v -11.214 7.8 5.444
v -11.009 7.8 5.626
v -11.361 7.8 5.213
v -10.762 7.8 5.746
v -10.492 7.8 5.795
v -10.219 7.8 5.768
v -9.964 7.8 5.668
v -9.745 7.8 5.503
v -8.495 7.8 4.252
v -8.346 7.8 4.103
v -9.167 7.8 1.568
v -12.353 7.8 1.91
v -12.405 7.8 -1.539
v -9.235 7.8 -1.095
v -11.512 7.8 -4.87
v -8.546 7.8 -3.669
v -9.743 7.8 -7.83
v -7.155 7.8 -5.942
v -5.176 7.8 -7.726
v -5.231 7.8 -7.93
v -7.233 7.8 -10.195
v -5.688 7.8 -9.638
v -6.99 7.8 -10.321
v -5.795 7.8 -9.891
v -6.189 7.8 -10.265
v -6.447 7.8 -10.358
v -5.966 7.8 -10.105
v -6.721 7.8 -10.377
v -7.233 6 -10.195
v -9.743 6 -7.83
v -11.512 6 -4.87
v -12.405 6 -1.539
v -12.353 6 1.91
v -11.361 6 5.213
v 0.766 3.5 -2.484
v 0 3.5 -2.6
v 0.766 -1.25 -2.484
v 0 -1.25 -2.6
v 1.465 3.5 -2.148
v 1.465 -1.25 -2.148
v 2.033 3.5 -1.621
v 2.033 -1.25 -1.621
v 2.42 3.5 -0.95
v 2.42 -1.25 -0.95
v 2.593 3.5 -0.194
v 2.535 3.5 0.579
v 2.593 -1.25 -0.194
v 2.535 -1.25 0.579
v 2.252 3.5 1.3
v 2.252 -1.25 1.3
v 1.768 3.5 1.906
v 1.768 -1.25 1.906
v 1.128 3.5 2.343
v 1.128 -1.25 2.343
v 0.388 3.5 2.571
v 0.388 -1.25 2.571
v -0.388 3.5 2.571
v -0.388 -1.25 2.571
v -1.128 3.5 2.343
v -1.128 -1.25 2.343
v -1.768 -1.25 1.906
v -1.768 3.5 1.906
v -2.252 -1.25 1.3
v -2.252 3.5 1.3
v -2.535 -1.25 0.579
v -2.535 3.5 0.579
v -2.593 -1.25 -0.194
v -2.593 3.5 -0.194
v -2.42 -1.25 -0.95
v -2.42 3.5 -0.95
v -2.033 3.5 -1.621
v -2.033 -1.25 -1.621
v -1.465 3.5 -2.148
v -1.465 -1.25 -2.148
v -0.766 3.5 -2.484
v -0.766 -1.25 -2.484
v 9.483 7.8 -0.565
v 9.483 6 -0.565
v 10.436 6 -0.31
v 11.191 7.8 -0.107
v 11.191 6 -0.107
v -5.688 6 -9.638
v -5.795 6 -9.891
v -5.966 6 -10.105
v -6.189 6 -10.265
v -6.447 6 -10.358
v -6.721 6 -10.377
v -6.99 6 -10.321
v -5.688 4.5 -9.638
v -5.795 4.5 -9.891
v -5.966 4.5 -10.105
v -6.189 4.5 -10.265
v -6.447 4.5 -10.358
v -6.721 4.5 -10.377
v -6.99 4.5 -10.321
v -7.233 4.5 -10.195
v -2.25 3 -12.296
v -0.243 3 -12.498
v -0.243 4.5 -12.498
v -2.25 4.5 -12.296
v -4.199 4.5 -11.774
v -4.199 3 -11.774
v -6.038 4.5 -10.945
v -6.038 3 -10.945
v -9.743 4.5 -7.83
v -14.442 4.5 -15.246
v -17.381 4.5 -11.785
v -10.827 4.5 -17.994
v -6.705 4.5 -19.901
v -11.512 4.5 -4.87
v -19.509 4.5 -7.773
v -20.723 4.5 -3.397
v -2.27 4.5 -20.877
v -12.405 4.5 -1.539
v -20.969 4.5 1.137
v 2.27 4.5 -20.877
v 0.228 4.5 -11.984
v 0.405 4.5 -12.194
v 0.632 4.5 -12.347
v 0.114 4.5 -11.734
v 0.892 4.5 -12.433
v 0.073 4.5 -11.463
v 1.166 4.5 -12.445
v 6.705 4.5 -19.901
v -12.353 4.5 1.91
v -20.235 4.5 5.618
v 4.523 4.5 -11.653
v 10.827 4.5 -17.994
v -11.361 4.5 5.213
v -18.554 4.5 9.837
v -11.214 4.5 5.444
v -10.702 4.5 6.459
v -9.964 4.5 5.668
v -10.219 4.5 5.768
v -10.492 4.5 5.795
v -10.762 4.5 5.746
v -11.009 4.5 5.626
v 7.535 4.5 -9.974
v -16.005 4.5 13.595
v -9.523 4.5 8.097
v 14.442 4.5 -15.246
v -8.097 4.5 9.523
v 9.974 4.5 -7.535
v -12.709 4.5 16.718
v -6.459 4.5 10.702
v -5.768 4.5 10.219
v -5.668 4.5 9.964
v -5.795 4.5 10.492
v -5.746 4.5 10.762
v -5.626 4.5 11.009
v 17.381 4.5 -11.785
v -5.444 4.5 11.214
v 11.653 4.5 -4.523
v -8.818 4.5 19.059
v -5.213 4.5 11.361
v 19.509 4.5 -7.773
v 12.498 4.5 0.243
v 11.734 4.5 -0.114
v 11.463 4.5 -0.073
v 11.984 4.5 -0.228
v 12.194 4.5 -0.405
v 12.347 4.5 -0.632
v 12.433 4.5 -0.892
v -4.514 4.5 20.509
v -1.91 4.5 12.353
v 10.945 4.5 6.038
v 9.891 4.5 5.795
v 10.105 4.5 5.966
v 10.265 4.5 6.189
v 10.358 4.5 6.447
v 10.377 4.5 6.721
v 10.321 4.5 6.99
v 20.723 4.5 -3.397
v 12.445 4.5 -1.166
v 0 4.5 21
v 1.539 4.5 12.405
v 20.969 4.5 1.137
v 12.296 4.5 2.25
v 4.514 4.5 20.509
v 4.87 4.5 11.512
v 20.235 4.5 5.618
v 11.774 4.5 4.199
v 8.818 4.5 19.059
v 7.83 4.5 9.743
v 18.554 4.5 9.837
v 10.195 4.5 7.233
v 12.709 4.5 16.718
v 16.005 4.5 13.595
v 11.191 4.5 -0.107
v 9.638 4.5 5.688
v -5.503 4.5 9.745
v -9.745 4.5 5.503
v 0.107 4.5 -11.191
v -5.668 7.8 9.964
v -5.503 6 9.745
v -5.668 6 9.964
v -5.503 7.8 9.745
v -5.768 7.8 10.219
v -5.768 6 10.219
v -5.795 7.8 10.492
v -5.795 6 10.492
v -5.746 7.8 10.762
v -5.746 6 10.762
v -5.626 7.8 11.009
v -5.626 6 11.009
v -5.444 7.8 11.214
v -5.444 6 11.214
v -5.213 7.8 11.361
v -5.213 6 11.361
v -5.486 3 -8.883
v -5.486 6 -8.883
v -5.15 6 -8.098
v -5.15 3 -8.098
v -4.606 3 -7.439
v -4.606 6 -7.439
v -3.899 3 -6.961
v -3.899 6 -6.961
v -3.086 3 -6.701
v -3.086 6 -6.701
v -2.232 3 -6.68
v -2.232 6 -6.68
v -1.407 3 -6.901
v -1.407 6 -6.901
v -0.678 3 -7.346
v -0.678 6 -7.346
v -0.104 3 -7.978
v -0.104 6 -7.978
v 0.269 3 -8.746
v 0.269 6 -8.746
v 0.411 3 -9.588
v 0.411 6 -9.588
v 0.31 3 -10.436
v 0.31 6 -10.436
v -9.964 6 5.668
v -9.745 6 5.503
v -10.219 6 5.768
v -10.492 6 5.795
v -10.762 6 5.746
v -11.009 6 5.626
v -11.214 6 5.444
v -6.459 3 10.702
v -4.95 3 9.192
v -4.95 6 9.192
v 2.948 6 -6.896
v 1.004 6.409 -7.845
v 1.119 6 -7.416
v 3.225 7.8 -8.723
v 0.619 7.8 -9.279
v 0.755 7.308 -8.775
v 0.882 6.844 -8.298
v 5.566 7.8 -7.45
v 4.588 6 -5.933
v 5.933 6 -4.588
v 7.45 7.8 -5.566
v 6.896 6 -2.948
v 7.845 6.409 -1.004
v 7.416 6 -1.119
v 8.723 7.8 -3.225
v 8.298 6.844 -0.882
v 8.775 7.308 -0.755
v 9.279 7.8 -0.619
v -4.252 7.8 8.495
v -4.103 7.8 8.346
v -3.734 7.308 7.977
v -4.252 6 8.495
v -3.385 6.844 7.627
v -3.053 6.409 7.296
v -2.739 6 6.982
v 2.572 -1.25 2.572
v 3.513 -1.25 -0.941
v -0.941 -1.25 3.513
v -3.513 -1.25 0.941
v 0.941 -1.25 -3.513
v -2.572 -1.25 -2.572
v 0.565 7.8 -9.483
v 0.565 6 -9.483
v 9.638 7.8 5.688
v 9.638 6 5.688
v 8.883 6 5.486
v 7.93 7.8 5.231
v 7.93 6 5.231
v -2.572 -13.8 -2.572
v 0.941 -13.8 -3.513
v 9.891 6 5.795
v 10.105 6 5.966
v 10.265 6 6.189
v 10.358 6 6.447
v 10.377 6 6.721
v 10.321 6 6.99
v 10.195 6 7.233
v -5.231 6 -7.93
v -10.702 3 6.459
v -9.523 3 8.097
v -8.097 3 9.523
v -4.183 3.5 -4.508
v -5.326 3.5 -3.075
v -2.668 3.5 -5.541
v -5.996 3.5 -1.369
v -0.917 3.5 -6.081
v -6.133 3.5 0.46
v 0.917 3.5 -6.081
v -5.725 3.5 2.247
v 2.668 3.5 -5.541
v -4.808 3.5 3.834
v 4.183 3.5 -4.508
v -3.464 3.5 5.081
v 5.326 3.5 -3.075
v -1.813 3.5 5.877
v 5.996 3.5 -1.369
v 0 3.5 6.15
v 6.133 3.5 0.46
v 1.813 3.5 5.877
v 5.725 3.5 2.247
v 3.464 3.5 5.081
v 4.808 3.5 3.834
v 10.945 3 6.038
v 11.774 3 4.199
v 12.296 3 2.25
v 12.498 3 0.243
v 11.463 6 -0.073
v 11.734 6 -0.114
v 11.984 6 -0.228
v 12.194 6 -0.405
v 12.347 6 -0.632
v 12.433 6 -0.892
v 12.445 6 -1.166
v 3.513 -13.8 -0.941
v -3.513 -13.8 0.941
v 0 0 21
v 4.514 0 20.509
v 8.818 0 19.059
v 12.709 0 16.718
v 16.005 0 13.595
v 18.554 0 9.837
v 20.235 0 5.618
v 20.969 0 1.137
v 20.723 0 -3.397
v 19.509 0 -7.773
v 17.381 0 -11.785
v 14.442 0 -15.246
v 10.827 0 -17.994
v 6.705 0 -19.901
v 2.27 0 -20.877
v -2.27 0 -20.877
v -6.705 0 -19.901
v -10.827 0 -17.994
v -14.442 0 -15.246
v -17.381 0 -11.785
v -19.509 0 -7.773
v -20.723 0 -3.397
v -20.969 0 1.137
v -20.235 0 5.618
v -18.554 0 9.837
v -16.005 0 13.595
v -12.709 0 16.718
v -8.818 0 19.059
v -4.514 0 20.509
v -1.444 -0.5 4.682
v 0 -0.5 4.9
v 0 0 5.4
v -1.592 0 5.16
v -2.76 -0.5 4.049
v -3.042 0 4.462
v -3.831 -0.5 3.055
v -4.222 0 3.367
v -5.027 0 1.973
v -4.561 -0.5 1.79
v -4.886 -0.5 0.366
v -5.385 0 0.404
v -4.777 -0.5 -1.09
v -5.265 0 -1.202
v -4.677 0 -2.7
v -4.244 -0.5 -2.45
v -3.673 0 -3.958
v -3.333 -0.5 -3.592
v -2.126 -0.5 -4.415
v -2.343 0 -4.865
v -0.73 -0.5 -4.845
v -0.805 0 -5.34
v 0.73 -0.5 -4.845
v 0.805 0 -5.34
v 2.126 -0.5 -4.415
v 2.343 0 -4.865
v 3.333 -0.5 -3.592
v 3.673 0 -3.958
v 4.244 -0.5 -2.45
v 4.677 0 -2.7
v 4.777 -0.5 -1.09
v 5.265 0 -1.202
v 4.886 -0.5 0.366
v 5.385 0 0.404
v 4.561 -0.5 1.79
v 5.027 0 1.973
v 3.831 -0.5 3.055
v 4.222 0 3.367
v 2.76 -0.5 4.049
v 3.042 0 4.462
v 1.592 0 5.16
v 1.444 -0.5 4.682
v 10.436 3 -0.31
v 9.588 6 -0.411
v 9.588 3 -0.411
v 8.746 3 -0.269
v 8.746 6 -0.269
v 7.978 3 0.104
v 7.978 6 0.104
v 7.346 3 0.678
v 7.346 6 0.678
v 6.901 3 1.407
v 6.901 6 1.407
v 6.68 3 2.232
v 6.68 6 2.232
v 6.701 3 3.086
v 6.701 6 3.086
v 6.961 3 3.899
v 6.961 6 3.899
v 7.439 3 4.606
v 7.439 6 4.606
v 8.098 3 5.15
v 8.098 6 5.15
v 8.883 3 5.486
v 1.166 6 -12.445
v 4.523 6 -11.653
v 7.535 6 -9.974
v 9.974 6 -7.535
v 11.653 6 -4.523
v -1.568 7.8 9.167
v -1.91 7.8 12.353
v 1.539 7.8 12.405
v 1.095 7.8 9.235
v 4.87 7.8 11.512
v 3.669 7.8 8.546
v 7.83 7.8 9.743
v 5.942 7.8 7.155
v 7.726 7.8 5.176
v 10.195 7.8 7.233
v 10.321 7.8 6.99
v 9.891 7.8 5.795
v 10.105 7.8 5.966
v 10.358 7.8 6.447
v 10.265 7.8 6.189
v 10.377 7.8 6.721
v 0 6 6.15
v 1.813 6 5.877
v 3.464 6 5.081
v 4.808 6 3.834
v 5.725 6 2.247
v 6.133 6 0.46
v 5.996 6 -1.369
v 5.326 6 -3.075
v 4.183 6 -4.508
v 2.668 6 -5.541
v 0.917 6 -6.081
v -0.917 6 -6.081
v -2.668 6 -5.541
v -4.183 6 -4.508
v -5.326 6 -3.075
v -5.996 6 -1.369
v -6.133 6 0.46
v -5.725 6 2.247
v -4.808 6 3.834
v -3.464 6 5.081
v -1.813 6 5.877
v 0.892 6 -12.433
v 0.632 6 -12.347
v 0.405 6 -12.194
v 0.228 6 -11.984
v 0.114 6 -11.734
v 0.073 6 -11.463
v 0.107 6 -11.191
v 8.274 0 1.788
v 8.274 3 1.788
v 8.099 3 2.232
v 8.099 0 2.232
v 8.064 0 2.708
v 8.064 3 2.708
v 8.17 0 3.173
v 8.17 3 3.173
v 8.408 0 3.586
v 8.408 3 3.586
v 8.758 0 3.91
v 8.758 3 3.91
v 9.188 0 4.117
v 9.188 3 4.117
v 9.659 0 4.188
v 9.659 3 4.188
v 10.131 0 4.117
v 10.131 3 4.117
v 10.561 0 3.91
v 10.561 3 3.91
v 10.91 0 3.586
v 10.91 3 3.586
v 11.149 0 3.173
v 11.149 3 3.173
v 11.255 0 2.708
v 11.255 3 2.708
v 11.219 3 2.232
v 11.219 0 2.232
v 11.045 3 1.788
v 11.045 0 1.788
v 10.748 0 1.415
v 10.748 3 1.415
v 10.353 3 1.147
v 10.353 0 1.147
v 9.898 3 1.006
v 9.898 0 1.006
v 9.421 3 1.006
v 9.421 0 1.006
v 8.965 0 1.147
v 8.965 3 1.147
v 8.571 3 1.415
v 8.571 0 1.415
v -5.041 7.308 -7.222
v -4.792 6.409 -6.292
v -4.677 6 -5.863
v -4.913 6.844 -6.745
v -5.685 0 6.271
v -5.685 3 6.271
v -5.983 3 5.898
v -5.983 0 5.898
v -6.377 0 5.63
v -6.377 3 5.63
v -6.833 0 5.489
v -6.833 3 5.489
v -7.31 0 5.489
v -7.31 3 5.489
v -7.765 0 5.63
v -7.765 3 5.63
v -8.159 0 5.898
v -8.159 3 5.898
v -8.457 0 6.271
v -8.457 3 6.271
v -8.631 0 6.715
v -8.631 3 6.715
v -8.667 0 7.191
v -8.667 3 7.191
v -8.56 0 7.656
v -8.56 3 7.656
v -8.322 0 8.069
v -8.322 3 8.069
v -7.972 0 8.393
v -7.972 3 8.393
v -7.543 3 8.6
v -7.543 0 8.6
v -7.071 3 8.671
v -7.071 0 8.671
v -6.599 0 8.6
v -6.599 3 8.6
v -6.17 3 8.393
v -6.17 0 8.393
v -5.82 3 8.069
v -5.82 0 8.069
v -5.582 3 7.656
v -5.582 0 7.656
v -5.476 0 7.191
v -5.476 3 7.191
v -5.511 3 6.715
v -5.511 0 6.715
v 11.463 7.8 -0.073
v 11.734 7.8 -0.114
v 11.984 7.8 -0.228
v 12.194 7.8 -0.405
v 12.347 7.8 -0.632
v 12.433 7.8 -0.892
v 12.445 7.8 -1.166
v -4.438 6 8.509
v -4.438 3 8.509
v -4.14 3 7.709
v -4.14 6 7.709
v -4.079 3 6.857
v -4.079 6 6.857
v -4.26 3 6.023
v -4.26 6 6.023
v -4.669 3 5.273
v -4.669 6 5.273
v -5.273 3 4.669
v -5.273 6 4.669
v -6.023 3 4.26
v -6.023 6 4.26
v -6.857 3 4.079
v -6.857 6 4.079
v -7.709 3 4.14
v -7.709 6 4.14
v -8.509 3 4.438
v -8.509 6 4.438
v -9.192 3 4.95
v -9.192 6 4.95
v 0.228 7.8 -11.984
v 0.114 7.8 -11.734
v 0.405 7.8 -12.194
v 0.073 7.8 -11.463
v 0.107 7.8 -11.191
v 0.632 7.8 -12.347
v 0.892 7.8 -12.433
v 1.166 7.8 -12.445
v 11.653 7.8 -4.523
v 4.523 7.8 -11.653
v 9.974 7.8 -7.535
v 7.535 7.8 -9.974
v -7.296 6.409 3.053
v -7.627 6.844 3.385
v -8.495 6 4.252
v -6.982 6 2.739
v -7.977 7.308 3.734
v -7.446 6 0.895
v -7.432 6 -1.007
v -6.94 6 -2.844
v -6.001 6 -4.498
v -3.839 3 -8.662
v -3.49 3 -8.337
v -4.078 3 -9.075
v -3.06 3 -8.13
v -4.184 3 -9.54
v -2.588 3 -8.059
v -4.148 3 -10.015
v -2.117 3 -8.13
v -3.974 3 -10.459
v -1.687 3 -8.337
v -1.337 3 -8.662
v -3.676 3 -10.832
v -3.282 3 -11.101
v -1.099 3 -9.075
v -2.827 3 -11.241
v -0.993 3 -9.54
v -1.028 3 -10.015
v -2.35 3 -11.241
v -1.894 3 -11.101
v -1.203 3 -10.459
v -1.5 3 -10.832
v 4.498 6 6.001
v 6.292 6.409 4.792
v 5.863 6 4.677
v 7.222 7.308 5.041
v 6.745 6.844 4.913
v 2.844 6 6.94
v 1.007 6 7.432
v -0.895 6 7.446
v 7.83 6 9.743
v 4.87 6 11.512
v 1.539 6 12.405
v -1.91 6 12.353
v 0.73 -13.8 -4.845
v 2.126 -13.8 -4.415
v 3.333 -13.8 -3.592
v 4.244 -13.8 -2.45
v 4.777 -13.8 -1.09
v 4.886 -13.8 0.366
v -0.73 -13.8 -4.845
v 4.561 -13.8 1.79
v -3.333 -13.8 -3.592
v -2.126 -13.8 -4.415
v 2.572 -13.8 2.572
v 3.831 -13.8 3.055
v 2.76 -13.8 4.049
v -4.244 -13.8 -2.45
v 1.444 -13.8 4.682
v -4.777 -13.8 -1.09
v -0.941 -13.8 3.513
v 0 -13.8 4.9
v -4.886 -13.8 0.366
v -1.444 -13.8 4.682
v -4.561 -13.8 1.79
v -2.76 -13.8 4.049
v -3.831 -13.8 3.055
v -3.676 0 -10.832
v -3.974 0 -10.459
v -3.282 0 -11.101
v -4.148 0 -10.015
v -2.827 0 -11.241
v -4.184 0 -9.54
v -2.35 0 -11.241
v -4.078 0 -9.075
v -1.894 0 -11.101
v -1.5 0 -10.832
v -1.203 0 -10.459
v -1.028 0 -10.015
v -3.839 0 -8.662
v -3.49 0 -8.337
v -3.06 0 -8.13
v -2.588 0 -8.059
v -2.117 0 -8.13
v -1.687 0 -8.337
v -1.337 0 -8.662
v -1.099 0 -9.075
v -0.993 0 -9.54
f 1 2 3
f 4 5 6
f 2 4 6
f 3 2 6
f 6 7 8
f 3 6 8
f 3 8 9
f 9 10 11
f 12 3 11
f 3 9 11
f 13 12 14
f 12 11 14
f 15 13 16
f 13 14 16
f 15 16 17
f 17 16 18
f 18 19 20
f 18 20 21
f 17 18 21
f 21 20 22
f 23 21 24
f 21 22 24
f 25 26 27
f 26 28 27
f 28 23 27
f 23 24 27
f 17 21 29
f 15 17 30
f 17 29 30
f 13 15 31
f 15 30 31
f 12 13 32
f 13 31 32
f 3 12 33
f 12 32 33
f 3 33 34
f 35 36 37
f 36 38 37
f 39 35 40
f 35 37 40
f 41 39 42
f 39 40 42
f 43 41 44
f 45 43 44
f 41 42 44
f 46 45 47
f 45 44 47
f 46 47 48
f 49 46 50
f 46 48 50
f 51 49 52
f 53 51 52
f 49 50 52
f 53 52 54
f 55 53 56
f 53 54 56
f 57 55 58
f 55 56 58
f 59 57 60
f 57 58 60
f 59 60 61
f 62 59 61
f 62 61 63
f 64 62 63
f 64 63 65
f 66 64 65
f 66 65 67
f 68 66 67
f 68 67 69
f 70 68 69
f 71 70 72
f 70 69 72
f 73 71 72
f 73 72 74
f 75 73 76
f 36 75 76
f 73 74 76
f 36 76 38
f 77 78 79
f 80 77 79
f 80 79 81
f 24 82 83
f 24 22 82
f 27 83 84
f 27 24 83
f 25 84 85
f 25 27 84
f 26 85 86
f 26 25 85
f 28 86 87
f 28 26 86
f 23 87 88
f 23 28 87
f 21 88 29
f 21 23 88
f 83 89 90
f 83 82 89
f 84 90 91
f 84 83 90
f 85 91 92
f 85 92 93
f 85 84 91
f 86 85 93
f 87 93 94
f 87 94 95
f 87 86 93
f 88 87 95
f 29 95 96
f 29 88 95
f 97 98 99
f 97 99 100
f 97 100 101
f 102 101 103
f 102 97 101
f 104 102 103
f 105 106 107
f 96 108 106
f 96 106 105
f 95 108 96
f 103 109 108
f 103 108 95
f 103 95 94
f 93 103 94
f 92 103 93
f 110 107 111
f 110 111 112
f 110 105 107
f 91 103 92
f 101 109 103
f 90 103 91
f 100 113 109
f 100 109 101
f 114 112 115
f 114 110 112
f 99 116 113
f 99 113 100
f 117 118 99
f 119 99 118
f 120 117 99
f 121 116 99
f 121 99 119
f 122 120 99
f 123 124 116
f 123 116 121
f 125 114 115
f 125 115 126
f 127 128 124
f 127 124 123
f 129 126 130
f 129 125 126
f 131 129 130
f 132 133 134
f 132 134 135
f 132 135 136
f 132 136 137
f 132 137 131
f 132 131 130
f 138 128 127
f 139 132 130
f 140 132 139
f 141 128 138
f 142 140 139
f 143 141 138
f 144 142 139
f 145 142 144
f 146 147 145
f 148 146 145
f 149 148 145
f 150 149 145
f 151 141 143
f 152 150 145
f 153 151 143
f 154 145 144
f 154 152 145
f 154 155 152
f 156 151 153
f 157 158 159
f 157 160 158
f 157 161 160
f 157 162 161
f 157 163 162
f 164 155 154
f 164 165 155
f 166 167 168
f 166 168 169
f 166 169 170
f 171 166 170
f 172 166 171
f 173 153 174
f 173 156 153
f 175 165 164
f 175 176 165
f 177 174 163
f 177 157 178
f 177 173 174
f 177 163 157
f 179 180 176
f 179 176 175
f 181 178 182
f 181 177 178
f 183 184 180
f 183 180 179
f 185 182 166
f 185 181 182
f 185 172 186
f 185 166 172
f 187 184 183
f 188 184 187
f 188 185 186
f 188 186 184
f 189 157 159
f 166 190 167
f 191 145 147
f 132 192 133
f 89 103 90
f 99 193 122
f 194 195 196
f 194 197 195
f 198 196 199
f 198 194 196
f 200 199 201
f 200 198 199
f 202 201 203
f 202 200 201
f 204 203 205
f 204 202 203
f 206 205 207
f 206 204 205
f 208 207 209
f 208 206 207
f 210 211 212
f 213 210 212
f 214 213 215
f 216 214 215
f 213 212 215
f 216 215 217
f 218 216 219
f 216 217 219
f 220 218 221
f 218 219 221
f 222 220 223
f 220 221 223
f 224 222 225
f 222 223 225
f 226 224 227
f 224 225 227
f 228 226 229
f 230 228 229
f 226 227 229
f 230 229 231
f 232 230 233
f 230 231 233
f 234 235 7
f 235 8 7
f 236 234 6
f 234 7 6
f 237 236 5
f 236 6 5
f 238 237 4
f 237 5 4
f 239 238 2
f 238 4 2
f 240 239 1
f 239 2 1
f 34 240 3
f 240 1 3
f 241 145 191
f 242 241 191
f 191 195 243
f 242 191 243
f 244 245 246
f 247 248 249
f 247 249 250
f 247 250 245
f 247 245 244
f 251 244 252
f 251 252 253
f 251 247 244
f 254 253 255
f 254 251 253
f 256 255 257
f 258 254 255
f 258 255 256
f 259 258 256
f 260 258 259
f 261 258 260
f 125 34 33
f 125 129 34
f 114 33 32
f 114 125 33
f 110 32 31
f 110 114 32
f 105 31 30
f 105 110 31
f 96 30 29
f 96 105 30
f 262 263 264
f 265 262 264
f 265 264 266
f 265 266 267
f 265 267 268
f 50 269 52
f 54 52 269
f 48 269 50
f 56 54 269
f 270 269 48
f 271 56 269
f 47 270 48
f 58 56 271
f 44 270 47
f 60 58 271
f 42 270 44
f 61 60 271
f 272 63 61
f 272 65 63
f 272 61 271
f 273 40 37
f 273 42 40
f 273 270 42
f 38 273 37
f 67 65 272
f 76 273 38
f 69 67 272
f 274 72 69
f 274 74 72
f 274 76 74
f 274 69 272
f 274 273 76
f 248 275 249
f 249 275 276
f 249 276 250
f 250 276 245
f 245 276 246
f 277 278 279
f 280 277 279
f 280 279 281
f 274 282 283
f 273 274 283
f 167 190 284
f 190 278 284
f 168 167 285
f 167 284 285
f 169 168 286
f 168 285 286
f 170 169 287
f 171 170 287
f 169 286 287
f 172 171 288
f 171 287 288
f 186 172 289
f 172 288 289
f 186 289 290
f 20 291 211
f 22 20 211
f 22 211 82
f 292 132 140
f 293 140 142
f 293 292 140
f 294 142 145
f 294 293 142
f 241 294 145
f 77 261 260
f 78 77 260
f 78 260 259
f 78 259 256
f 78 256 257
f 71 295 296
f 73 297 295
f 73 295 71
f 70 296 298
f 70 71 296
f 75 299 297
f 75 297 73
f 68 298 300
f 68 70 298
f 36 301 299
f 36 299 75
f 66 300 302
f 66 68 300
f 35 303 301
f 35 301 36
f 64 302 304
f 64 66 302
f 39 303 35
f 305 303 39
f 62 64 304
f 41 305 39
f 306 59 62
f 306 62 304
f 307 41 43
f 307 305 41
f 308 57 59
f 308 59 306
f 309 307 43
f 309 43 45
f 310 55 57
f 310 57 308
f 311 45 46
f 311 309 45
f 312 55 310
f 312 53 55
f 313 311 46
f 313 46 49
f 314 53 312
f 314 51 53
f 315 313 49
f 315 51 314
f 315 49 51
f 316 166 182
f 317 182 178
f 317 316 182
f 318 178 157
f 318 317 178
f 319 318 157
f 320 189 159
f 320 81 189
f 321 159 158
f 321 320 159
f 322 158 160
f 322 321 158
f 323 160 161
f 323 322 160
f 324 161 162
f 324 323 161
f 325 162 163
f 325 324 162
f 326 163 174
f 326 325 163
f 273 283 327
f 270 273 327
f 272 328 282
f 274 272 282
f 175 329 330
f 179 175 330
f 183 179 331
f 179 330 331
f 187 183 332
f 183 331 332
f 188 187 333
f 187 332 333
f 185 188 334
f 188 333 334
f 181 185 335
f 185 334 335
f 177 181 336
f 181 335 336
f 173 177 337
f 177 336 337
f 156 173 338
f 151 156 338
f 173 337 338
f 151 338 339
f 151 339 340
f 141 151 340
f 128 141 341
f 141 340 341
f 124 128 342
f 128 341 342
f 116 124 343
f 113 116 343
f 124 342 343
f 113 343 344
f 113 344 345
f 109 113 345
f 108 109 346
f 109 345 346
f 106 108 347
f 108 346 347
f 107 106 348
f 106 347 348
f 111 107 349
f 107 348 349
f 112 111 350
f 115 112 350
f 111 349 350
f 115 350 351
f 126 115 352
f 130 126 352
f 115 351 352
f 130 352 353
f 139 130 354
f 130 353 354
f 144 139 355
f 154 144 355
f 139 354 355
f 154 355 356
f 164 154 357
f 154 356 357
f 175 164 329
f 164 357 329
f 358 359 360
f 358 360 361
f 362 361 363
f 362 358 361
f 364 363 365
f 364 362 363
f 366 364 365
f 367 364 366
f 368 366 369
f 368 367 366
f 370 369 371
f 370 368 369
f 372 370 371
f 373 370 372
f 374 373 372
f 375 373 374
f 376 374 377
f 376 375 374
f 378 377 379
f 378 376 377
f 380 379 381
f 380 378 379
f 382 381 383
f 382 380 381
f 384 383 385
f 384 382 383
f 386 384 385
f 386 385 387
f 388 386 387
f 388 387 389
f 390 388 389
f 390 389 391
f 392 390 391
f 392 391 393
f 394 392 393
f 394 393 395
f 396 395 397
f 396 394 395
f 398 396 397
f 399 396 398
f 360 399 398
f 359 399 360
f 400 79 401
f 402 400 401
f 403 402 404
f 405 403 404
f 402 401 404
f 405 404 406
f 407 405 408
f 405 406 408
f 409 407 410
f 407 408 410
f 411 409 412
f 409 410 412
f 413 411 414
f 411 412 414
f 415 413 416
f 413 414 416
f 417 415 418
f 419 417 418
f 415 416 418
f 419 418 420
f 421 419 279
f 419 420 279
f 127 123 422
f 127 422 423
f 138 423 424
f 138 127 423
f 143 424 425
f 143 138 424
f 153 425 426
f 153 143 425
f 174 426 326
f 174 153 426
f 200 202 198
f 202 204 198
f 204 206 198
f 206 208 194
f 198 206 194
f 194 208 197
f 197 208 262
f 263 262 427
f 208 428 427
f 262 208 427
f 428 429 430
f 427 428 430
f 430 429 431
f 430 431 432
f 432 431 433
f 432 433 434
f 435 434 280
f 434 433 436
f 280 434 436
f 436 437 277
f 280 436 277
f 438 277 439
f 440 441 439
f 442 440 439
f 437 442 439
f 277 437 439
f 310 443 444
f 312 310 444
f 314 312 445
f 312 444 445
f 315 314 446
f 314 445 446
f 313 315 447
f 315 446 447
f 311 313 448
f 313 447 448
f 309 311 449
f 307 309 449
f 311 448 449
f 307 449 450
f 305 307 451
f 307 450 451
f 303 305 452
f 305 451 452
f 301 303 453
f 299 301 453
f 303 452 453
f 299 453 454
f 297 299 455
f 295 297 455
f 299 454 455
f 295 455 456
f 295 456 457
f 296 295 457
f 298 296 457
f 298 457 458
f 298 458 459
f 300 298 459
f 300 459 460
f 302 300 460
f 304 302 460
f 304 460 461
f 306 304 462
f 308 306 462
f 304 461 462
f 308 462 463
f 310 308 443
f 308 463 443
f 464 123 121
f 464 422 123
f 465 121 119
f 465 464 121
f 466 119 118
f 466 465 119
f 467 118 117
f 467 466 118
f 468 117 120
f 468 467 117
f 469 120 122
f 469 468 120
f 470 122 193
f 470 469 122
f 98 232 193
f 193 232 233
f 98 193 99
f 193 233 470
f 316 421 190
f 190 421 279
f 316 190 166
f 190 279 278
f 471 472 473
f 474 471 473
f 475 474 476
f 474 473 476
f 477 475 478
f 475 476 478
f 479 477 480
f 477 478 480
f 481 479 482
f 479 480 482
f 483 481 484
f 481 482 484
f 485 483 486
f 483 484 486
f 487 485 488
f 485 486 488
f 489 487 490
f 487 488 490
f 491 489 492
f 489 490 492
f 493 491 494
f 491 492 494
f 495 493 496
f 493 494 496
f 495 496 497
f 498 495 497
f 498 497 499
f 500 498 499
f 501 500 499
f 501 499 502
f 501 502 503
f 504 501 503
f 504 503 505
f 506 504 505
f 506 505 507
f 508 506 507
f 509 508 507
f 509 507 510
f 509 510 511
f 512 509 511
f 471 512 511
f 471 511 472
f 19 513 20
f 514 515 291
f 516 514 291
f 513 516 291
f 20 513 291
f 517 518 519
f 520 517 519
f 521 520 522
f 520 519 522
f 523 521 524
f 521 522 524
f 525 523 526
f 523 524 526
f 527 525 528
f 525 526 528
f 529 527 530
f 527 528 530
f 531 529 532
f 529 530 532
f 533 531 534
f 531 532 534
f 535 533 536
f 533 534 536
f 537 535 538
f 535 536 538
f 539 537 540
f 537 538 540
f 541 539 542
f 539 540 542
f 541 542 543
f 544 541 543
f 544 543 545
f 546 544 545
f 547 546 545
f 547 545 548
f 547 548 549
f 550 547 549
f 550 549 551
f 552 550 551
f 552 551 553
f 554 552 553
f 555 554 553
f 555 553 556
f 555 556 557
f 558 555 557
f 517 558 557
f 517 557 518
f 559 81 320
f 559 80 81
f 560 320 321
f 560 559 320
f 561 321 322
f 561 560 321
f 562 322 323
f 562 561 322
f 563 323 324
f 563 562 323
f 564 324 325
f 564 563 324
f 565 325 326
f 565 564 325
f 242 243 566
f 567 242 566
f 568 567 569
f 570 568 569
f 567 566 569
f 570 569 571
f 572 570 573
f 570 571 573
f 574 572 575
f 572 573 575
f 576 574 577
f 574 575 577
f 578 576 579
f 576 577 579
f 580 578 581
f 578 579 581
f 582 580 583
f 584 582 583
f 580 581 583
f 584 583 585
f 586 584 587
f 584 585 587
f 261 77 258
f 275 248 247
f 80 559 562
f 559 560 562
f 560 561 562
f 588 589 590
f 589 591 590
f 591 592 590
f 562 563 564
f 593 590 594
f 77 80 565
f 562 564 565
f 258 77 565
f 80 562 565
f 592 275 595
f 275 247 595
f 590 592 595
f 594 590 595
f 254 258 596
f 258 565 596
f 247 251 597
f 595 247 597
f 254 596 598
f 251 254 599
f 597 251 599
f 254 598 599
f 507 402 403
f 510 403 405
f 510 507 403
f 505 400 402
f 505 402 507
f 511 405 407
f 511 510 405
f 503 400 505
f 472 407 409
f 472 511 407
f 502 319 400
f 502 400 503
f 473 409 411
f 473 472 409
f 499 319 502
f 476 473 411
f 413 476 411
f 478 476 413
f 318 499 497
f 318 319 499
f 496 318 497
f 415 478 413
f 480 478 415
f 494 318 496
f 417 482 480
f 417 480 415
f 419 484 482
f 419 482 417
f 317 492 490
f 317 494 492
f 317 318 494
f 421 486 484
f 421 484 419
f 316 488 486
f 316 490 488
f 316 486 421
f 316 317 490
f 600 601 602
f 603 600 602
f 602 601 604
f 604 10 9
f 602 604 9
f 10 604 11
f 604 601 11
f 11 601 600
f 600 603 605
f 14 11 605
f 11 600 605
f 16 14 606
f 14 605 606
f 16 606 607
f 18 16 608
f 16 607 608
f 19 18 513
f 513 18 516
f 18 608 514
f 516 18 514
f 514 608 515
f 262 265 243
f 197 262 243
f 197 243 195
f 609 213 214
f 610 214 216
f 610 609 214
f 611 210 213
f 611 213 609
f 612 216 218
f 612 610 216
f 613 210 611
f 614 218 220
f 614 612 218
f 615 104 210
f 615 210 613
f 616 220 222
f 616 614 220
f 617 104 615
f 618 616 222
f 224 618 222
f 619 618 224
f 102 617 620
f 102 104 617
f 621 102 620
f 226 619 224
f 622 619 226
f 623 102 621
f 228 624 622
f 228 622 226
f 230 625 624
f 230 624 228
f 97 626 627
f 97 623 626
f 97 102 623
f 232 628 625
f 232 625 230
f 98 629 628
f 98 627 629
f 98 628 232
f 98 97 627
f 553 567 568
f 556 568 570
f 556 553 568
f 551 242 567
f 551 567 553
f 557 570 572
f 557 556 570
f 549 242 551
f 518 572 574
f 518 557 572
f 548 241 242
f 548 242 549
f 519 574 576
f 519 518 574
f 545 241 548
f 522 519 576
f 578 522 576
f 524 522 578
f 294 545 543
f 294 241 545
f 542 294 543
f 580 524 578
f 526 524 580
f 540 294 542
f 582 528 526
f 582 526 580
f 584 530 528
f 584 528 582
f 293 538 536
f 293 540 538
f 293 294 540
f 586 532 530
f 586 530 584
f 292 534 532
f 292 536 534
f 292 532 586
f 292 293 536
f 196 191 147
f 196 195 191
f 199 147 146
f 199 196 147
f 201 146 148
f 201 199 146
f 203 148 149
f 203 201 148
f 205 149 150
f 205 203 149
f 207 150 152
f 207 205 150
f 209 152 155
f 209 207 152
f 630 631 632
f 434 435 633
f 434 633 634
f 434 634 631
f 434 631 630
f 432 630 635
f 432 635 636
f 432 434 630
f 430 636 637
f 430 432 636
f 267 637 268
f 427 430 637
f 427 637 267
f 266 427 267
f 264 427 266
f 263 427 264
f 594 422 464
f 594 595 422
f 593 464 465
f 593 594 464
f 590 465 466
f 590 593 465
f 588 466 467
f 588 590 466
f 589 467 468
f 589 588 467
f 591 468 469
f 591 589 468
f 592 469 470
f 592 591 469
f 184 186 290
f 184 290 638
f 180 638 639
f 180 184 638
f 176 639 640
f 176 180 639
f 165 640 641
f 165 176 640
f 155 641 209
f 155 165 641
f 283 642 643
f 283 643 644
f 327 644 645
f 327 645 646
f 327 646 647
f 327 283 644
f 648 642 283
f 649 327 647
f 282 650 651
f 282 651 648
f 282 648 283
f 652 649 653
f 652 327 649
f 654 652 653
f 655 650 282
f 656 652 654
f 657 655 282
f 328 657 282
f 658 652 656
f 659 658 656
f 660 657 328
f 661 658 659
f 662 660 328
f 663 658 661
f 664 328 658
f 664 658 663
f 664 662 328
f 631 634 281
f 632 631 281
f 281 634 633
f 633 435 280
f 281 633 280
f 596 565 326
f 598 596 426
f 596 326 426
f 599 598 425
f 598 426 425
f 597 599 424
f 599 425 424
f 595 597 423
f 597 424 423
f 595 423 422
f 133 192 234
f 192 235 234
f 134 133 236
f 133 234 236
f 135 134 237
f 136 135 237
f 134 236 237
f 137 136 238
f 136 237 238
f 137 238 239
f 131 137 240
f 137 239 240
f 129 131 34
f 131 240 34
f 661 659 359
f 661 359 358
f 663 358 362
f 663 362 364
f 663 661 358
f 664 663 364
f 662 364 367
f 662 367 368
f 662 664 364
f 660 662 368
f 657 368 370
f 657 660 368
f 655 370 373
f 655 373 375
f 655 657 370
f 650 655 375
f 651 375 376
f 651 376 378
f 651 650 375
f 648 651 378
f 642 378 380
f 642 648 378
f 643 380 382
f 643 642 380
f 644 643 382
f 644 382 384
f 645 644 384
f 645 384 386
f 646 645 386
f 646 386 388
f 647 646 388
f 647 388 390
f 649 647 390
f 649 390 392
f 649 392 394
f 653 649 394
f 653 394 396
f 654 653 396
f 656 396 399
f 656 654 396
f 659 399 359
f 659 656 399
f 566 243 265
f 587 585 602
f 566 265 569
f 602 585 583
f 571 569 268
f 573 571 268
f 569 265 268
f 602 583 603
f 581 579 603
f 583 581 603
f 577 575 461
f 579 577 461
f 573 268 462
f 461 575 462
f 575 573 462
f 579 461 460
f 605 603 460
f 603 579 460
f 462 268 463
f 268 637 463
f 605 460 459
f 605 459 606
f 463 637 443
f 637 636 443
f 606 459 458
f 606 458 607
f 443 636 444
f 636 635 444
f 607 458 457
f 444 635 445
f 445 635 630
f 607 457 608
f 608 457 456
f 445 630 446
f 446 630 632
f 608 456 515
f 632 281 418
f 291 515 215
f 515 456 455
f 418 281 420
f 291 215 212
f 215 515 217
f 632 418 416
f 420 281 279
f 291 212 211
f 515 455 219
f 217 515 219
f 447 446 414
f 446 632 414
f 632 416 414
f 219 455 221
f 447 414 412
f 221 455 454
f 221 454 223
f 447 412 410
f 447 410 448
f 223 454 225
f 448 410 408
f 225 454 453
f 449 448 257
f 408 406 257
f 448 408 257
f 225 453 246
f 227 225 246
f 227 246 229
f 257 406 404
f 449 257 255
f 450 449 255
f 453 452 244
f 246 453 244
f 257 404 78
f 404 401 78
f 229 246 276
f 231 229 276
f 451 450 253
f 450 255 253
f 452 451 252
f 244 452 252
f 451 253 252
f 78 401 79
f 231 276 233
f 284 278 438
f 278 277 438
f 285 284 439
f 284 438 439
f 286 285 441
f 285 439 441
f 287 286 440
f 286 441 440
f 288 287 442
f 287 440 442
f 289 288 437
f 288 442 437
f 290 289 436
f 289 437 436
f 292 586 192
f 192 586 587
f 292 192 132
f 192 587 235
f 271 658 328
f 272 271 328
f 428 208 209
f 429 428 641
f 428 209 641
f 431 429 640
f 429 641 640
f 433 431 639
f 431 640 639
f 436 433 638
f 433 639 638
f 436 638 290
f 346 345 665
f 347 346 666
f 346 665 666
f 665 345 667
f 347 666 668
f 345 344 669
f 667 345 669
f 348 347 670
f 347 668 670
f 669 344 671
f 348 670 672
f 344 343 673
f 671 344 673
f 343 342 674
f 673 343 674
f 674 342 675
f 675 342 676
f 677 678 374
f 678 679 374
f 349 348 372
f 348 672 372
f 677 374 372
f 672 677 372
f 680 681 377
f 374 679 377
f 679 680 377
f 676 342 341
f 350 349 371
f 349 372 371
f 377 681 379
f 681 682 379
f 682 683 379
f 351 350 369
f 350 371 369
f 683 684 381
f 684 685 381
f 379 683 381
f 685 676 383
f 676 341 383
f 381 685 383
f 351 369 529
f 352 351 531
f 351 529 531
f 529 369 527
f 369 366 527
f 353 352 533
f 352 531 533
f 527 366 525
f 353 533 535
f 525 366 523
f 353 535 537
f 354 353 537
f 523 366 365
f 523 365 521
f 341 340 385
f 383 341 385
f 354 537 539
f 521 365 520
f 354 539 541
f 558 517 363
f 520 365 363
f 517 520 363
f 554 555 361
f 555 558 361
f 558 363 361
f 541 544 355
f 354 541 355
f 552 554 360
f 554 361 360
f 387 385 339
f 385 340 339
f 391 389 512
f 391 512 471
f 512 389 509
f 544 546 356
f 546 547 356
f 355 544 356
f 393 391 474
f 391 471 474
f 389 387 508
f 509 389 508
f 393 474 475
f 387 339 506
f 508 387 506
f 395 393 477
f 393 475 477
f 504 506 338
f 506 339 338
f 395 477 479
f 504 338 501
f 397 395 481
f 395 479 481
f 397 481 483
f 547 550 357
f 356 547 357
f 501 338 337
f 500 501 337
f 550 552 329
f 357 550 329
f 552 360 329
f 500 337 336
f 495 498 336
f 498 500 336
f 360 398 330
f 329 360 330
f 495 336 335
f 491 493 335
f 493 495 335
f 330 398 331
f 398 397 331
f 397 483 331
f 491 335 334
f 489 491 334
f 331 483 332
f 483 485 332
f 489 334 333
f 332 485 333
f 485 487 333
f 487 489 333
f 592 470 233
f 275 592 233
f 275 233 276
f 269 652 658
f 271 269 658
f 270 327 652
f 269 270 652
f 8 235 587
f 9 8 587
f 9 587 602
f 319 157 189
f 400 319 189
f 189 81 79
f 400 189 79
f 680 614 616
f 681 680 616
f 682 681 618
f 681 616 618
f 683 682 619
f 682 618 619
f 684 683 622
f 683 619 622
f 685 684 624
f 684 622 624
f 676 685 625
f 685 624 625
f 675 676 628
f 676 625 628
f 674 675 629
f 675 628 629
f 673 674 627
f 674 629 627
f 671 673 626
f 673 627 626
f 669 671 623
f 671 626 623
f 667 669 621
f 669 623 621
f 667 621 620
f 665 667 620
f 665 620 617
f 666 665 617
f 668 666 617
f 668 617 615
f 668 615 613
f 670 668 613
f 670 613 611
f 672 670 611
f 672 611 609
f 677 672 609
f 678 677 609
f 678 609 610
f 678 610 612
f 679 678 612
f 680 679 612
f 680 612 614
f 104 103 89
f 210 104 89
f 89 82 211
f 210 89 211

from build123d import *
from build123d.topology import SkipClean

# Parameters (mm, degrees)
SKETCH_1_R               = 4
SKETCH_1_R_2             = 2.625
EXTRUDE_1_DEPTH          = 6
SKETCH_2_R               = 12.5
SKETCH_2_R_2             = 2.6
EXTRUDE_2_DEPTH          = 6
SKETCH_3_R               = 1.6
CUT_EXTRUDE_1_DEPTH      = 15
SKETCH_6_R               = 1.6
CUT_EXTRUDE_5_DEPTH      = 3
PATTERN_CIRCULAR_1_COUNT = 3
EXTRUDE_START            = 13.8
SKETCH_4_R               = 4.9
SKETCH_4_R_2             = 2.6
EXTRUDE_3_DEPTH          = 13.8
SKETCH_7_R               = 6.15
CUT_EXTRUDE_7_DEPTH      = 2.5
CUT_EXTRUDE_8_DEPTH      = 12.55
SKETCH_10_R              = 21
SKETCH_10_R_2            = 12.5
EXTRUDE_4_DEPTH          = 4.5
EXTRUDE_5_DEPTH          = 1.8
PATTERN_CIRCULAR_2_COUNT = 3
FILLET_1_R               = 1
CHAMFER_1_SIZE           = 0.5
CHAMFER_2_SIZE           = 2


with BuildPart() as part:
    # 草图1 → 凸台-拉伸1 (new body)
    with BuildSketch(Plane(origin=(0, 0, 0), x_dir=(1, 0, 0), z_dir=(0, 1, 0))):
        with Locations(Location((0, 0, 0), (0, 0, 270))):
            Circle(SKETCH_1_R)
        with Locations(Location((0, 0, 0), (0, 0, 270))):
            Circle(SKETCH_1_R_2, mode=Mode.SUBTRACT)
    extrude(amount=EXTRUDE_1_DEPTH)

    # 草图2 → 凸台-拉伸2 (add)
    with BuildSketch(Plane(origin=(0, 0, 0), x_dir=(-1, 0, 0), z_dir=(0, -1, 0))):
        with Locations(Location((0, 0, 0), (0, 0, 90))):
            Circle(SKETCH_2_R)
        with Locations(Location((0, 0, 0), (0, 0, 90))):
            Circle(SKETCH_2_R_2, mode=Mode.SUBTRACT)
    extrude(amount=-EXTRUDE_2_DEPTH)

    # 草图3 → 切除-拉伸1 (cut)
    with BuildSketch(Plane(origin=(0, 6, 0), x_dir=(1, 0, 0), z_dir=(0, 1, 0))):
        with Locations(Location((-2.588190451, 9.659258263, 0), (0, 0, 270))):
            Circle(SKETCH_3_R)
    cut_extrude_1 = extrude(amount=-CUT_EXTRUDE_1_DEPTH, mode=Mode.SUBTRACT)

    # 草图6 → 切除-拉伸5 (cut)
    with BuildSketch(Plane(origin=(0, 6, 0), x_dir=(1, 0, 0), z_dir=(0, 1, 0))):
        with BuildLine():
            Line((-6.038458877, 10.944725414), (-5.48596793, 8.882801128))
            ThreePointArc((-5.48596793, 8.882801128), (-1.811733316, 6.761480784), (0.309587028, 10.435715398))
            Line((0.309587028, 10.435715398), (-0.24290392, 12.497639685))
            ThreePointArc((-0.24290392, 12.497639685), (-3.235238064, 12.074072829), (-6.038458877, 10.944725414))
        make_face()
        with Locations(Location((-2.588190451, 9.659258263, 0), (0, 0, 270))):
            Circle(SKETCH_6_R, mode=Mode.SUBTRACT)
    cut_extrude_5 = extrude(amount=-CUT_EXTRUDE_5_DEPTH, mode=Mode.SUBTRACT)

    # 阵列(圆周)1: 切除-拉伸1, 切除-拉伸5 ×3 about axis
    pattern_circular_1_axis = Axis((0, 0, 0), (0, 1, 0))
    add([cut_extrude_1.rotate(pattern_circular_1_axis, i * 360 / PATTERN_CIRCULAR_1_COUNT) for i in range(1, PATTERN_CIRCULAR_1_COUNT)], mode=Mode.SUBTRACT)
    add([cut_extrude_5.rotate(pattern_circular_1_axis, i * 360 / PATTERN_CIRCULAR_1_COUNT) for i in range(1, PATTERN_CIRCULAR_1_COUNT)], mode=Mode.SUBTRACT)

    # 草图4 → 凸台-拉伸3 (add)
    with BuildSketch(Plane(origin=(0, 0, 0), x_dir=(-1, 0, 0), z_dir=(0, -1, 0)).offset(EXTRUDE_START)):
        with Locations(Location((0, 0, 0), (0, 0, 270))):
            Circle(SKETCH_4_R)
        with Locations(Location((0, 0, 0), (0, 0, 90))):
            Circle(SKETCH_4_R_2, mode=Mode.SUBTRACT)
    extrude(amount=-EXTRUDE_3_DEPTH)

    # 草图7 → 切除-拉伸7 (cut)
    with BuildSketch(Plane(origin=(0, 6, 0), x_dir=(1, 0, 0), z_dir=(0, 1, 0))):
        with Locations(Location((0, 0, 0), (0, 0, 270))):
            Circle(SKETCH_7_R)
    extrude(amount=-CUT_EXTRUDE_7_DEPTH, mode=Mode.SUBTRACT)

    # 草图8 → 切除-拉伸8 (cut)
    with BuildSketch(Plane(origin=(0, -13.8, 0), x_dir=(-1, 0, 0), z_dir=(0, -1, 0))):
        Polygon((-2.57196423, -2.57196423), (0.941404246, -3.513368476), (3.513368476, -0.941404246), (2.57196423, 2.57196423), (-0.941404246, 3.513368476), (-3.513368476, 0.941404246), align=None)
    extrude(amount=-CUT_EXTRUDE_8_DEPTH, mode=Mode.SUBTRACT)

    # 草图10 → 凸台-拉伸4 (add)
    with BuildSketch(Plane(origin=(0, 0, 0), x_dir=(1, 0, 0), z_dir=(0, 1, 0))):
        with Locations(Location((0, 0, 0), (0, 0, 270))):
            Circle(SKETCH_10_R)
        Circle(SKETCH_10_R_2, mode=Mode.SUBTRACT)
    extrude(amount=EXTRUDE_4_DEPTH)

    # 草图11 → 凸台-拉伸5 (add)
    with BuildSketch(Plane(origin=(0, 6, 0), x_dir=(1, 0, 0), z_dir=(0, 1, 0))):
        with BuildLine():
            Line((-5.230740824, 7.930280602), (-6.038458877, 10.944725414))
            ThreePointArc((-6.038458877, 10.944725414), (-12.074072829, 3.235238064), (-10.701821494, -6.459180807))
            Line((-10.701821494, -6.459180807), (-8.495094736, -4.252454048))
            ThreePointArc((-8.495094736, -4.252454048), (-9.17629535, 2.458780928), (-5.230740824, 7.930280602))
        make_face()
    extrude_5 = extrude(amount=EXTRUDE_5_DEPTH)

    # 阵列(圆周)2: 凸台-拉伸5 ×3 about axis
    with SkipClean():  # the faces are left unmerged after this step: merging them gives an invalid solid
        pattern_circular_2_axis = Axis((0, 3.5, 0), (0, 1, 0))
        for i in range(1, PATTERN_CIRCULAR_2_COUNT):
            add(extrude_5.rotate(pattern_circular_2_axis, i * 360 / PATTERN_CIRCULAR_2_COUNT))

    # 圆角1
    fillet_1_edges = [part.edges().sort_by_distance(p)[0] for p in [
        (-10.701821494, 6.9, 6.459180807),
        (-6.459180807, 6.9, 10.701821494),
        (10.944725414, 6.9, 6.038458877),
        (12.497639685, 6.9, 0.24290392),
        (-0.24290392, 6.9, -12.497639685),
        (-6.038458877, 6.9, -10.944725414),
    ]]
    fillet(fillet_1_edges, radius=FILLET_1_R)

    # 倒角1
    chamfer_1_edges = [part.edges().sort_by_distance(p)[0] for p in [
        (0, 0, -4.9),
    ]]
    chamfer(chamfer_1_edges, length=CHAMFER_1_SIZE)

    # 倒角2
    # the kernel refuses this chamfer: 2 mm, written as the material it adds along each edge
    with BuildSketch(Plane(origin=(0, 6, 0), x_dir=(-0.46364396793112084, 0, -0.8860215973671781), z_dir=(-0.8860215973671781, 0, 0.46364396793112084))) as chamfer_2_piece_1_section:
        Polygon((9.5 - CHAMFER_2_SIZE, 0), (9.5, -CHAMFER_2_SIZE), (9.5, 0), align=None)
    chamfer_2_piece_1 = revolve(axis=Axis((0, 6, 0), (0, -1, 0)), revolution_arc=145.244994466, mode=Mode.PRIVATE)
    chamfer_2_piece_1 = split(chamfer_2_piece_1, bisect_by=Plane(origin=(4.843261848, 6.879467901, -1.80808044), z_dir=(0.2588190451025276, 0, -0.9659258262890666)), keep=Keep.TOP, mode=Mode.PRIVATE)
    chamfer_2_piece_1 = split(chamfer_2_piece_1, bisect_by=Plane(origin=(1.80808044, 6.879467901, -4.843261848), z_dir=(0.9659258262890712, 0, -0.2588190451025102)), keep=Keep.TOP, mode=Mode.PRIVATE)
    chamfer_2_piece_1 = split(chamfer_2_piece_1, bisect_by=Plane(origin=(5.954215348, 7.8, -5.954215348), z_dir=(0, -1, 0)), keep=Keep.TOP, mode=Mode.PRIVATE)
    add(chamfer_2_piece_1)
    with BuildSketch(Plane(origin=(0, 6, 0), x_dir=(0.9991391955872041, 0, 0.04148334414382066), z_dir=(0.04148334414382066, 0, -0.9991391955872041))) as chamfer_2_piece_2_section:
        Polygon((9.5 - CHAMFER_2_SIZE, 0), (9.5, -CHAMFER_2_SIZE), (9.5, 0), align=None)
    chamfer_2_piece_2 = revolve(axis=Axis((0, 6, 0), (0, -1, 0)), revolution_arc=145.244994466, mode=Mode.PRIVATE)
    chamfer_2_piece_2 = split(chamfer_2_piece_2, bisect_by=Plane(origin=(3.290347577, 6.879467901, 3.987474517), z_dir=(-0.25881904510253106, 0, 0.9659258262890655)), keep=Keep.TOP, mode=Mode.PRIVATE)
    chamfer_2_piece_2 = split(chamfer_2_piece_2, bisect_by=Plane(origin=(-0.855787331, 6.879467901, 5.098428018), z_dir=(0.7071067811865428, 0, 0.7071067811865523)), keep=Keep.TOP, mode=Mode.PRIVATE)
    chamfer_2_piece_2 = split(chamfer_2_piece_2, bisect_by=Plane(origin=(2.179394077, 7.8, 8.133609425), z_dir=(0, -1, 0)), keep=Keep.TOP, mode=Mode.PRIVATE)
    add(chamfer_2_piece_2)
    with BuildSketch(Plane(origin=(0, 6, 0), x_dir=(-0.535495227656083, 0, 0.8445382532233574), z_dir=(0.8445382532233574, 0, 0.535495227656083))) as chamfer_2_piece_3_section:
        Polygon((9.5, -CHAMFER_2_SIZE), (9.5 - CHAMFER_2_SIZE, 0), (9.5, 0), align=None)
    chamfer_2_piece_3 = revolve(axis=Axis((0, 6, 0), (0, -1, 0)), revolution_arc=145.244994466, mode=Mode.PRIVATE)
    chamfer_2_piece_3 = split(chamfer_2_piece_3, bisect_by=Plane(origin=(-3.987474517, 6.879467901, -3.290347577), z_dir=(-0.96592582628907, 0, 0.25881904510251447)), keep=Keep.TOP, mode=Mode.PRIVATE)
    chamfer_2_piece_3 = split(chamfer_2_piece_3, bisect_by=Plane(origin=(-5.098428018, 6.879467901, 0.855787331), z_dir=(-0.7071067811865401, 0, -0.7071067811865549)), keep=Keep.TOP, mode=Mode.PRIVATE)
    chamfer_2_piece_3 = split(chamfer_2_piece_3, bisect_by=Plane(origin=(-8.133609425, 7.8, -2.179394077), z_dir=(0, -1, 0)), keep=Keep.TOP, mode=Mode.PRIVATE)
    add(chamfer_2_piece_3)


solid = part.part
